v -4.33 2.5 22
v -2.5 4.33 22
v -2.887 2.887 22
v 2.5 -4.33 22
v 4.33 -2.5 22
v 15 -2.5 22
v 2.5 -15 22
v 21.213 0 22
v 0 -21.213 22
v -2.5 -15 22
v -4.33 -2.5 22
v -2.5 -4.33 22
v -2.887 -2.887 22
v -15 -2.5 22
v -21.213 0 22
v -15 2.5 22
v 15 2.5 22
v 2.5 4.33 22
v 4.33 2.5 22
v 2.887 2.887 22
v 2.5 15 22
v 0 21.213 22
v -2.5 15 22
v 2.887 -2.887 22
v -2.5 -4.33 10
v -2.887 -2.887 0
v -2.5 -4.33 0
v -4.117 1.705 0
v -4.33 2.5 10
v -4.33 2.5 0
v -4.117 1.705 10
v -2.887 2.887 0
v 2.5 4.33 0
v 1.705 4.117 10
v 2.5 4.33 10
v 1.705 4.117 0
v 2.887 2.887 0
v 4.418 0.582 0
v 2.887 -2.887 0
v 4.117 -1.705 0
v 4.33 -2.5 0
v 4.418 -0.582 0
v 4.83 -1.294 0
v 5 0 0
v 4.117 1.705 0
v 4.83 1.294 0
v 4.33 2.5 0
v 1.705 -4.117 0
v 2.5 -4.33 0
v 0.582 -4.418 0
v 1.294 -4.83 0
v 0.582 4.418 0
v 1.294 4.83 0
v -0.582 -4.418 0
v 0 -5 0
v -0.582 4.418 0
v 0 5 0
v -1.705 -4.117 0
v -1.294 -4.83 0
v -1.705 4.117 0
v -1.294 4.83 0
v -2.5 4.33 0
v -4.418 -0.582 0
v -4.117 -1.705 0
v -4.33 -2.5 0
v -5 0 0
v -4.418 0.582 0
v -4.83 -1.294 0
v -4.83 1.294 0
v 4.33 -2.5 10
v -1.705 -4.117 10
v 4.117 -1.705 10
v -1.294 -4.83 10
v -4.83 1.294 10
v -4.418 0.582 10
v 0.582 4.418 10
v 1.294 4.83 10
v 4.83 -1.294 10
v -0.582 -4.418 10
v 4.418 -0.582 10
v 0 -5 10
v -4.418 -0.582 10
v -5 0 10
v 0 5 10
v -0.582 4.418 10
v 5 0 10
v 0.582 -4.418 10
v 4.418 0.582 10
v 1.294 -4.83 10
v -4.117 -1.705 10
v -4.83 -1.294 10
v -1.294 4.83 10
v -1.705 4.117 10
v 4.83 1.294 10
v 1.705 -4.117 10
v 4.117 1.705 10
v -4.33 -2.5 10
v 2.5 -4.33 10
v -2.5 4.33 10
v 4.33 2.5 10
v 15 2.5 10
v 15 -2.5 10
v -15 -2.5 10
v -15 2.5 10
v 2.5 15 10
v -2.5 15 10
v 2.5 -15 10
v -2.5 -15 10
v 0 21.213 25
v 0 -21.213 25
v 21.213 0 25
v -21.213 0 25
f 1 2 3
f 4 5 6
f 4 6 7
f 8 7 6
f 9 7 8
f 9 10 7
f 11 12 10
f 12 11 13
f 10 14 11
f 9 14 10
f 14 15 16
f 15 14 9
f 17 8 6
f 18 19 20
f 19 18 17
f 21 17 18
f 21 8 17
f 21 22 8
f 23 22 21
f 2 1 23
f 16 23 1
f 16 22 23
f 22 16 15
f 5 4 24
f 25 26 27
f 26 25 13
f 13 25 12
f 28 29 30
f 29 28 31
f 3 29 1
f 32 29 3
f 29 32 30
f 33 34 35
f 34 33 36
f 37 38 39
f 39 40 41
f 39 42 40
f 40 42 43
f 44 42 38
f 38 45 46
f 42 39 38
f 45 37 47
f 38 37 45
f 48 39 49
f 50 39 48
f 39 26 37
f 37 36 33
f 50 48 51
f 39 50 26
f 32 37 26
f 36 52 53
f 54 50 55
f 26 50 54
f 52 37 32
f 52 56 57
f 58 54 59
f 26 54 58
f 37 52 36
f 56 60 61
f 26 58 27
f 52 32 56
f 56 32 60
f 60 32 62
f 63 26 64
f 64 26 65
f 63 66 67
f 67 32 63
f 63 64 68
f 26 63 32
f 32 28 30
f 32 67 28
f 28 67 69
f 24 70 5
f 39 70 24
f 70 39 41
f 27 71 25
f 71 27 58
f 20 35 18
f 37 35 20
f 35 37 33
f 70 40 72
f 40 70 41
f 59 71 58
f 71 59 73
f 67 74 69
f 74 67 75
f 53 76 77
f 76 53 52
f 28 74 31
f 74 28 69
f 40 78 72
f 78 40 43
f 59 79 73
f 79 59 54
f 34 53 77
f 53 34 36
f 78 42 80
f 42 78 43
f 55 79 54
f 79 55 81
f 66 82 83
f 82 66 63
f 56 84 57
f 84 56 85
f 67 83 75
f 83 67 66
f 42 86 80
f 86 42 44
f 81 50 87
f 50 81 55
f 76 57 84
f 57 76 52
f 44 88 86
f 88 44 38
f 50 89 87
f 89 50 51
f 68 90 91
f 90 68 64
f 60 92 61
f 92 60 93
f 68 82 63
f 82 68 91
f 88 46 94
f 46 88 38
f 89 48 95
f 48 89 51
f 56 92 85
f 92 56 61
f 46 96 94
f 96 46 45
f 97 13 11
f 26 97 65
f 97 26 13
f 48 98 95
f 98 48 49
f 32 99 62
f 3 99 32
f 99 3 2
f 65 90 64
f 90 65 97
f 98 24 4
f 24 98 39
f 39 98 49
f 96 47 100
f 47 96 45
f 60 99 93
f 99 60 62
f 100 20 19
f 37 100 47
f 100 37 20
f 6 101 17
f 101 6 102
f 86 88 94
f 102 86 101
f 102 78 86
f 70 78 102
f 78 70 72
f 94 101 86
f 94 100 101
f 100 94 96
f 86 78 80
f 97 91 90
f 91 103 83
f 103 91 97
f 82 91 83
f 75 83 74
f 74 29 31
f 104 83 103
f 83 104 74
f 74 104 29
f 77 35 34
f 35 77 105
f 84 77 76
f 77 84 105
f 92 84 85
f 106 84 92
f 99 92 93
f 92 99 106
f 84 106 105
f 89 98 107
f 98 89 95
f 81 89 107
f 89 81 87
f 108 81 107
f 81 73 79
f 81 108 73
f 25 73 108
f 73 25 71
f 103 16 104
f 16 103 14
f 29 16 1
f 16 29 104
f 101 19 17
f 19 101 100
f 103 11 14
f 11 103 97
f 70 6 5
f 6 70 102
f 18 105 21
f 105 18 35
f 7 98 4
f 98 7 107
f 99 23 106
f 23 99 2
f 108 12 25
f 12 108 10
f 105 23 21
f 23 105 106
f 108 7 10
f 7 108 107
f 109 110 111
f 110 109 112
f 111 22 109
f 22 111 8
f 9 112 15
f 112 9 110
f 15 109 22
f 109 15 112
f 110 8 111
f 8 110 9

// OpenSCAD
CD_CASE_SIZE = [142, 125, 10];

HOLDER_RADIUS = 5;

COVER_SIZE = HOLDER_RADIUS + 25;
COVER_THICKNESS = 3;

// https://en.wikipedia.org/wiki/Optical_disc_packaging#Jewel_case
module JewelCase()
{
    color(rands(0, 1.0, 3))
    cube(CD_CASE_SIZE);
}

function hypotenuse(a, b) = sqrt(a * a + b * b);

module Holder(backingThickness)
{
    EXTRA_Z_SPACE = 2; // Space between CD jewel case and holder cover
    height = CD_CASE_SIZE[2] + backingThickness + EXTRA_Z_SPACE;

    color("silver")
    union()
    {
        // Stem
        //cylinder(h=height, r=HOLDER_RADIUS);

        // Stem - Spiky
        s = hypotenuse(HOLDER_RADIUS, HOLDER_RADIUS);
        for (theta = [15 : 15 : 90 - 15])
        {
            rotate([0, 0,  theta])
            translate([0, 0, height / 2])
            cube([s, s, height], center=true);
        }

        // Cover
        rotate([0, 0, 45])
        translate([0, 0, height + COVER_THICKNESS / 2])
        cube([COVER_SIZE, COVER_SIZE, COVER_THICKNESS], center=true);

        // Weird extra cover
        //translate([0, 0, height + COVER_THICKNESS / 2])
        //cube([COVER_SIZE, COVER_SIZE, COVER_THICKNESS], center=true);

        // Plates to hold and separate CD jewel cases
        w = HOLDER_RADIUS; //w = 1;
        h = height - backingThickness;
        translate([0, 0, h/2 + backingThickness])
        {
            cube([COVER_SIZE, w, h], center=true);
            cube([w, COVER_SIZE, h], center=true);
        }
    }
}

module ArrayOfJewelCases(numCDX, numCDY, spacing)
{
    for (x = [0 : 1 : numCDX - 1])
    {
        for (y = [0 : 1 : numCDY - 1])
        {
            xPos = x * (CD_CASE_SIZE[0] + spacing);
            yPos = y * (CD_CASE_SIZE[1] + spacing);
            translate([xPos, yPos, 0])
            JewelCase();
        }
    }
}

module ArrayOfHolders(numCDX, numCDY, spacing, backingThickness)
{
    for (x = [0 : 1 : numCDX])
    {
        for (y = [0 : 1 : numCDY])
        {
            xPos = x * (CD_CASE_SIZE[0] + spacing) - spacing / 2;
            yPos = y * (CD_CASE_SIZE[1] + spacing) - spacing / 2;
            translate([xPos, yPos, 0])
            Holder(backingThickness);
        }
    }
}

module BackingBoard(numCDX, numCDY, spacing, border, backingThickness, holeDepth)
{
    xSize = border * 2 + numCDX * CD_CASE_SIZE[0] + spacing * (numCDX - 1);
    ySize = border * 2 + numCDY * CD_CASE_SIZE[1] + spacing * (numCDY - 1);

    echo("Backing board is ", xSize, " mm by r=", ySize, " mm");

    // Backing board with holes for holders
    difference()
    {
        color("Sienna")
        cube([xSize, ySize, backingThickness]);

         // TODO: Make this a holder hole, not a holder as they will probably be different sizes (hole a little smaller)
        translate([border, border, backingThickness - holeDepth])
        ArrayOfHolders(numCDX, numCDY, spacing, backingThickness);
    }
}

module CDwall(numCDX, numCDY, spacing, border, backingThickness)
{
    holeDepth = backingThickness; // Cut all the way through, TODO: Should I do this?

    // Backing board
    BackingBoard(numCDX, numCDY, spacing, border, backingThickness, holeDepth)

    // ?????? !!!!!!!!!!!!!!!!!!!!!!
    translate([border, border, backingThickness - holeDepth])
    ArrayOfHolders(numCDX, numCDY, spacing, backingThickness);

    // Holders
    translate([border, border, backingThickness - holeDepth])
    ArrayOfHolders(numCDX, numCDY, spacing, backingThickness);

    // Jewel cases
    translate([border, border, backingThickness])
    ArrayOfJewelCases(numCDX, numCDY, spacing);
}

module HolderArrayForPrinting(numCDX, numCDY, spacing, backingThickness)
{
    spacing = hypotenuse(COVER_SIZE, COVER_SIZE);

    rotate([180, 0, 0])
    intersection()
    {
        translate([-HOLDER_RADIUS, -HOLDER_RADIUS, -25])
        cube([numCDX * spacing + 2 * HOLDER_RADIUS,
              numCDY * spacing + 2 * HOLDER_RADIUS,
              75]);

        for (x = [0 : 1 : numCDX])
        {
            for (y = [0 : 1 : numCDY])
            {
                translate([x * spacing, y * spacing, 0])
                Holder(backingThickness);
            }
        }
    }
}

backingThickness = 10;

//CDwall(8, 3, HOLDER_RADIUS + 2, 50, backingThickness);

//HolderArrayForPrinting(4, 3, backingThickness);

Holder(backingThickness);
